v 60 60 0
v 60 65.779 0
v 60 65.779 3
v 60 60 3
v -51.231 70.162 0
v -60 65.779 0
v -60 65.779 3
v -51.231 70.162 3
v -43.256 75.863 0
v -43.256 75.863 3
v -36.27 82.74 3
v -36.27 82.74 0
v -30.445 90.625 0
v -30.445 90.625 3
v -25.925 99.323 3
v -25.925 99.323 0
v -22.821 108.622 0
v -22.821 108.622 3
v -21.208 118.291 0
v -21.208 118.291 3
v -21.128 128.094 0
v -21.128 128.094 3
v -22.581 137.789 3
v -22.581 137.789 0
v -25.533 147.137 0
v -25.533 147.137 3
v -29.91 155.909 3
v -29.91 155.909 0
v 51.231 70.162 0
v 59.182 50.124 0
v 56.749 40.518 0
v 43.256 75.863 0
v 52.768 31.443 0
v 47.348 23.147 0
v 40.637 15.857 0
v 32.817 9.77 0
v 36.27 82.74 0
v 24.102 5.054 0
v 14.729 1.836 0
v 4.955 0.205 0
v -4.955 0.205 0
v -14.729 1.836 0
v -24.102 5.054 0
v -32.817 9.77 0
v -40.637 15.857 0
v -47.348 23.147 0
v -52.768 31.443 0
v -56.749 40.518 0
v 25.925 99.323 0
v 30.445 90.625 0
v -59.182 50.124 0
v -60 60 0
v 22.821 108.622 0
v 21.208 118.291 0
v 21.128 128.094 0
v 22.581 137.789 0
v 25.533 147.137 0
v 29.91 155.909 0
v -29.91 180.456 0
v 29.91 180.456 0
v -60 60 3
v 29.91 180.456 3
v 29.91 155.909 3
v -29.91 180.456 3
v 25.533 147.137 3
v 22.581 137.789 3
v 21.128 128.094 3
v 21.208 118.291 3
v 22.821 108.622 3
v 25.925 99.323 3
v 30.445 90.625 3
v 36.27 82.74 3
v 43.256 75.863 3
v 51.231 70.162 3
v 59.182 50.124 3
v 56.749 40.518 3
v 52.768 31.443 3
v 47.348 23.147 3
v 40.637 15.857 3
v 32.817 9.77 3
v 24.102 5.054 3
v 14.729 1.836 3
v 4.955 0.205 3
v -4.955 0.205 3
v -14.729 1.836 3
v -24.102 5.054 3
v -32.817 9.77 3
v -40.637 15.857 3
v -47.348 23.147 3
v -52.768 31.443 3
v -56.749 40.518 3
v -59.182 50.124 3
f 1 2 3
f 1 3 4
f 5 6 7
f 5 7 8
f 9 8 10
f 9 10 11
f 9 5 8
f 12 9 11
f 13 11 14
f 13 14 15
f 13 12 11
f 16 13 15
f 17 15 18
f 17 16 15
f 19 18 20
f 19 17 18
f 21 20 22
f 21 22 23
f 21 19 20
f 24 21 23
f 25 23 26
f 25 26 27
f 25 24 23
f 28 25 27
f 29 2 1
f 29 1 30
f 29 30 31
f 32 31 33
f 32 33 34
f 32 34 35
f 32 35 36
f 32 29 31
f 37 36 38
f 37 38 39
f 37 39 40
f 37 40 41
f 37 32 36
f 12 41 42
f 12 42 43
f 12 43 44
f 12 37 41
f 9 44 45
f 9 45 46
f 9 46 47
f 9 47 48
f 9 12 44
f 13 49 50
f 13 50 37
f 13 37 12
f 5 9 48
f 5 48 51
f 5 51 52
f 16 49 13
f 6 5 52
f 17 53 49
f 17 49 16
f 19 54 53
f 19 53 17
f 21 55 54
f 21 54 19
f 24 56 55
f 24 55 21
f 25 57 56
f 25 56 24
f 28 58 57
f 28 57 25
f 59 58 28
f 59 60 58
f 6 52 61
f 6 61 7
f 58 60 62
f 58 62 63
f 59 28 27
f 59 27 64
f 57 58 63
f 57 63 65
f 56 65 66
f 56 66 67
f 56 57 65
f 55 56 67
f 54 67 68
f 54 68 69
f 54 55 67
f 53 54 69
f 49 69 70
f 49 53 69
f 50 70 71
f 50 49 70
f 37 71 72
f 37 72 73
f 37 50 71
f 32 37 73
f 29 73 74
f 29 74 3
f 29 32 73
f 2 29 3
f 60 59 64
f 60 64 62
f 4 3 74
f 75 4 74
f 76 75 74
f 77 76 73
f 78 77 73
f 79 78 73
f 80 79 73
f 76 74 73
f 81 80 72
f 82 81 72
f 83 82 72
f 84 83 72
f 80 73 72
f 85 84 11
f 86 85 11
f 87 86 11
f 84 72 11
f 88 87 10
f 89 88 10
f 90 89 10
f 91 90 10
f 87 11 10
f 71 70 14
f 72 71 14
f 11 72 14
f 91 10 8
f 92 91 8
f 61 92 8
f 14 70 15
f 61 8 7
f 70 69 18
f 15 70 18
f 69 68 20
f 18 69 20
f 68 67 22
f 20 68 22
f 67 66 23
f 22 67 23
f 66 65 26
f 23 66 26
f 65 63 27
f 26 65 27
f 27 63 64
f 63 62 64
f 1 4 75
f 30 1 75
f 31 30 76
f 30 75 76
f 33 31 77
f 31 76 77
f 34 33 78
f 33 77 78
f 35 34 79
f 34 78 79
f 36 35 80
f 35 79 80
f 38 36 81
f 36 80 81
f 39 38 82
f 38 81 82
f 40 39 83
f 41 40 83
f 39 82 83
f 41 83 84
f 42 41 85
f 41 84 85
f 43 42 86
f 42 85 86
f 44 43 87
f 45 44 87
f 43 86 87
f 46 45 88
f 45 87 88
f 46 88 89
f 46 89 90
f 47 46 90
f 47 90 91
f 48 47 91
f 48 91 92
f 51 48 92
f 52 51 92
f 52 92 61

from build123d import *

# Parameters (mm, degrees)
BOSS_EXTRUDE1_DEPTH = 3
CUT_EXTRUDE1_DEPTH  = 4


with BuildPart() as part:
    # Sketch1 → Boss-Extrude1 (new body)
    with BuildSketch(Plane.XY):
        with BuildLine():
            Line((60, 65.779396594), (60, 0))
            Line((60, 0), (-60, 0))
            Line((-60, 0), (-60, 65.779396594))
            ThreePointArc((-60, 65.779396594), (-24.19023261, 103.91162188), (-29.909652169, 155.908682236))
            Line((-29.909652169, 155.908682236), (-29.909652169, 180.455528653))
            Line((-29.909652169, 180.455528653), (29.909652169, 180.455528653))
            Line((29.909652169, 180.455528653), (29.909652169, 155.908682236))
            ThreePointArc((29.909652169, 155.908682236), (24.19023261, 103.91162188), (60, 65.779396594))
        make_face()
    extrude(amount=BOSS_EXTRUDE1_DEPTH)

    # Sketch2 → Cut-Extrude1 (cut, through all)
    with BuildSketch(Plane.XY.offset(3)):
        with BuildLine():
            Line((-60, 60), (-60, -14.155296416))
            Line((-60, -14.155296416), (60, -14.155296416))
            Line((60, -14.155296416), (60, 60))
            ThreePointArc((60, 60), (0, 0), (-60, 60))
        make_face()
    extrude(amount=-CUT_EXTRUDE1_DEPTH, mode=Mode.SUBTRACT)


solid = part.part
